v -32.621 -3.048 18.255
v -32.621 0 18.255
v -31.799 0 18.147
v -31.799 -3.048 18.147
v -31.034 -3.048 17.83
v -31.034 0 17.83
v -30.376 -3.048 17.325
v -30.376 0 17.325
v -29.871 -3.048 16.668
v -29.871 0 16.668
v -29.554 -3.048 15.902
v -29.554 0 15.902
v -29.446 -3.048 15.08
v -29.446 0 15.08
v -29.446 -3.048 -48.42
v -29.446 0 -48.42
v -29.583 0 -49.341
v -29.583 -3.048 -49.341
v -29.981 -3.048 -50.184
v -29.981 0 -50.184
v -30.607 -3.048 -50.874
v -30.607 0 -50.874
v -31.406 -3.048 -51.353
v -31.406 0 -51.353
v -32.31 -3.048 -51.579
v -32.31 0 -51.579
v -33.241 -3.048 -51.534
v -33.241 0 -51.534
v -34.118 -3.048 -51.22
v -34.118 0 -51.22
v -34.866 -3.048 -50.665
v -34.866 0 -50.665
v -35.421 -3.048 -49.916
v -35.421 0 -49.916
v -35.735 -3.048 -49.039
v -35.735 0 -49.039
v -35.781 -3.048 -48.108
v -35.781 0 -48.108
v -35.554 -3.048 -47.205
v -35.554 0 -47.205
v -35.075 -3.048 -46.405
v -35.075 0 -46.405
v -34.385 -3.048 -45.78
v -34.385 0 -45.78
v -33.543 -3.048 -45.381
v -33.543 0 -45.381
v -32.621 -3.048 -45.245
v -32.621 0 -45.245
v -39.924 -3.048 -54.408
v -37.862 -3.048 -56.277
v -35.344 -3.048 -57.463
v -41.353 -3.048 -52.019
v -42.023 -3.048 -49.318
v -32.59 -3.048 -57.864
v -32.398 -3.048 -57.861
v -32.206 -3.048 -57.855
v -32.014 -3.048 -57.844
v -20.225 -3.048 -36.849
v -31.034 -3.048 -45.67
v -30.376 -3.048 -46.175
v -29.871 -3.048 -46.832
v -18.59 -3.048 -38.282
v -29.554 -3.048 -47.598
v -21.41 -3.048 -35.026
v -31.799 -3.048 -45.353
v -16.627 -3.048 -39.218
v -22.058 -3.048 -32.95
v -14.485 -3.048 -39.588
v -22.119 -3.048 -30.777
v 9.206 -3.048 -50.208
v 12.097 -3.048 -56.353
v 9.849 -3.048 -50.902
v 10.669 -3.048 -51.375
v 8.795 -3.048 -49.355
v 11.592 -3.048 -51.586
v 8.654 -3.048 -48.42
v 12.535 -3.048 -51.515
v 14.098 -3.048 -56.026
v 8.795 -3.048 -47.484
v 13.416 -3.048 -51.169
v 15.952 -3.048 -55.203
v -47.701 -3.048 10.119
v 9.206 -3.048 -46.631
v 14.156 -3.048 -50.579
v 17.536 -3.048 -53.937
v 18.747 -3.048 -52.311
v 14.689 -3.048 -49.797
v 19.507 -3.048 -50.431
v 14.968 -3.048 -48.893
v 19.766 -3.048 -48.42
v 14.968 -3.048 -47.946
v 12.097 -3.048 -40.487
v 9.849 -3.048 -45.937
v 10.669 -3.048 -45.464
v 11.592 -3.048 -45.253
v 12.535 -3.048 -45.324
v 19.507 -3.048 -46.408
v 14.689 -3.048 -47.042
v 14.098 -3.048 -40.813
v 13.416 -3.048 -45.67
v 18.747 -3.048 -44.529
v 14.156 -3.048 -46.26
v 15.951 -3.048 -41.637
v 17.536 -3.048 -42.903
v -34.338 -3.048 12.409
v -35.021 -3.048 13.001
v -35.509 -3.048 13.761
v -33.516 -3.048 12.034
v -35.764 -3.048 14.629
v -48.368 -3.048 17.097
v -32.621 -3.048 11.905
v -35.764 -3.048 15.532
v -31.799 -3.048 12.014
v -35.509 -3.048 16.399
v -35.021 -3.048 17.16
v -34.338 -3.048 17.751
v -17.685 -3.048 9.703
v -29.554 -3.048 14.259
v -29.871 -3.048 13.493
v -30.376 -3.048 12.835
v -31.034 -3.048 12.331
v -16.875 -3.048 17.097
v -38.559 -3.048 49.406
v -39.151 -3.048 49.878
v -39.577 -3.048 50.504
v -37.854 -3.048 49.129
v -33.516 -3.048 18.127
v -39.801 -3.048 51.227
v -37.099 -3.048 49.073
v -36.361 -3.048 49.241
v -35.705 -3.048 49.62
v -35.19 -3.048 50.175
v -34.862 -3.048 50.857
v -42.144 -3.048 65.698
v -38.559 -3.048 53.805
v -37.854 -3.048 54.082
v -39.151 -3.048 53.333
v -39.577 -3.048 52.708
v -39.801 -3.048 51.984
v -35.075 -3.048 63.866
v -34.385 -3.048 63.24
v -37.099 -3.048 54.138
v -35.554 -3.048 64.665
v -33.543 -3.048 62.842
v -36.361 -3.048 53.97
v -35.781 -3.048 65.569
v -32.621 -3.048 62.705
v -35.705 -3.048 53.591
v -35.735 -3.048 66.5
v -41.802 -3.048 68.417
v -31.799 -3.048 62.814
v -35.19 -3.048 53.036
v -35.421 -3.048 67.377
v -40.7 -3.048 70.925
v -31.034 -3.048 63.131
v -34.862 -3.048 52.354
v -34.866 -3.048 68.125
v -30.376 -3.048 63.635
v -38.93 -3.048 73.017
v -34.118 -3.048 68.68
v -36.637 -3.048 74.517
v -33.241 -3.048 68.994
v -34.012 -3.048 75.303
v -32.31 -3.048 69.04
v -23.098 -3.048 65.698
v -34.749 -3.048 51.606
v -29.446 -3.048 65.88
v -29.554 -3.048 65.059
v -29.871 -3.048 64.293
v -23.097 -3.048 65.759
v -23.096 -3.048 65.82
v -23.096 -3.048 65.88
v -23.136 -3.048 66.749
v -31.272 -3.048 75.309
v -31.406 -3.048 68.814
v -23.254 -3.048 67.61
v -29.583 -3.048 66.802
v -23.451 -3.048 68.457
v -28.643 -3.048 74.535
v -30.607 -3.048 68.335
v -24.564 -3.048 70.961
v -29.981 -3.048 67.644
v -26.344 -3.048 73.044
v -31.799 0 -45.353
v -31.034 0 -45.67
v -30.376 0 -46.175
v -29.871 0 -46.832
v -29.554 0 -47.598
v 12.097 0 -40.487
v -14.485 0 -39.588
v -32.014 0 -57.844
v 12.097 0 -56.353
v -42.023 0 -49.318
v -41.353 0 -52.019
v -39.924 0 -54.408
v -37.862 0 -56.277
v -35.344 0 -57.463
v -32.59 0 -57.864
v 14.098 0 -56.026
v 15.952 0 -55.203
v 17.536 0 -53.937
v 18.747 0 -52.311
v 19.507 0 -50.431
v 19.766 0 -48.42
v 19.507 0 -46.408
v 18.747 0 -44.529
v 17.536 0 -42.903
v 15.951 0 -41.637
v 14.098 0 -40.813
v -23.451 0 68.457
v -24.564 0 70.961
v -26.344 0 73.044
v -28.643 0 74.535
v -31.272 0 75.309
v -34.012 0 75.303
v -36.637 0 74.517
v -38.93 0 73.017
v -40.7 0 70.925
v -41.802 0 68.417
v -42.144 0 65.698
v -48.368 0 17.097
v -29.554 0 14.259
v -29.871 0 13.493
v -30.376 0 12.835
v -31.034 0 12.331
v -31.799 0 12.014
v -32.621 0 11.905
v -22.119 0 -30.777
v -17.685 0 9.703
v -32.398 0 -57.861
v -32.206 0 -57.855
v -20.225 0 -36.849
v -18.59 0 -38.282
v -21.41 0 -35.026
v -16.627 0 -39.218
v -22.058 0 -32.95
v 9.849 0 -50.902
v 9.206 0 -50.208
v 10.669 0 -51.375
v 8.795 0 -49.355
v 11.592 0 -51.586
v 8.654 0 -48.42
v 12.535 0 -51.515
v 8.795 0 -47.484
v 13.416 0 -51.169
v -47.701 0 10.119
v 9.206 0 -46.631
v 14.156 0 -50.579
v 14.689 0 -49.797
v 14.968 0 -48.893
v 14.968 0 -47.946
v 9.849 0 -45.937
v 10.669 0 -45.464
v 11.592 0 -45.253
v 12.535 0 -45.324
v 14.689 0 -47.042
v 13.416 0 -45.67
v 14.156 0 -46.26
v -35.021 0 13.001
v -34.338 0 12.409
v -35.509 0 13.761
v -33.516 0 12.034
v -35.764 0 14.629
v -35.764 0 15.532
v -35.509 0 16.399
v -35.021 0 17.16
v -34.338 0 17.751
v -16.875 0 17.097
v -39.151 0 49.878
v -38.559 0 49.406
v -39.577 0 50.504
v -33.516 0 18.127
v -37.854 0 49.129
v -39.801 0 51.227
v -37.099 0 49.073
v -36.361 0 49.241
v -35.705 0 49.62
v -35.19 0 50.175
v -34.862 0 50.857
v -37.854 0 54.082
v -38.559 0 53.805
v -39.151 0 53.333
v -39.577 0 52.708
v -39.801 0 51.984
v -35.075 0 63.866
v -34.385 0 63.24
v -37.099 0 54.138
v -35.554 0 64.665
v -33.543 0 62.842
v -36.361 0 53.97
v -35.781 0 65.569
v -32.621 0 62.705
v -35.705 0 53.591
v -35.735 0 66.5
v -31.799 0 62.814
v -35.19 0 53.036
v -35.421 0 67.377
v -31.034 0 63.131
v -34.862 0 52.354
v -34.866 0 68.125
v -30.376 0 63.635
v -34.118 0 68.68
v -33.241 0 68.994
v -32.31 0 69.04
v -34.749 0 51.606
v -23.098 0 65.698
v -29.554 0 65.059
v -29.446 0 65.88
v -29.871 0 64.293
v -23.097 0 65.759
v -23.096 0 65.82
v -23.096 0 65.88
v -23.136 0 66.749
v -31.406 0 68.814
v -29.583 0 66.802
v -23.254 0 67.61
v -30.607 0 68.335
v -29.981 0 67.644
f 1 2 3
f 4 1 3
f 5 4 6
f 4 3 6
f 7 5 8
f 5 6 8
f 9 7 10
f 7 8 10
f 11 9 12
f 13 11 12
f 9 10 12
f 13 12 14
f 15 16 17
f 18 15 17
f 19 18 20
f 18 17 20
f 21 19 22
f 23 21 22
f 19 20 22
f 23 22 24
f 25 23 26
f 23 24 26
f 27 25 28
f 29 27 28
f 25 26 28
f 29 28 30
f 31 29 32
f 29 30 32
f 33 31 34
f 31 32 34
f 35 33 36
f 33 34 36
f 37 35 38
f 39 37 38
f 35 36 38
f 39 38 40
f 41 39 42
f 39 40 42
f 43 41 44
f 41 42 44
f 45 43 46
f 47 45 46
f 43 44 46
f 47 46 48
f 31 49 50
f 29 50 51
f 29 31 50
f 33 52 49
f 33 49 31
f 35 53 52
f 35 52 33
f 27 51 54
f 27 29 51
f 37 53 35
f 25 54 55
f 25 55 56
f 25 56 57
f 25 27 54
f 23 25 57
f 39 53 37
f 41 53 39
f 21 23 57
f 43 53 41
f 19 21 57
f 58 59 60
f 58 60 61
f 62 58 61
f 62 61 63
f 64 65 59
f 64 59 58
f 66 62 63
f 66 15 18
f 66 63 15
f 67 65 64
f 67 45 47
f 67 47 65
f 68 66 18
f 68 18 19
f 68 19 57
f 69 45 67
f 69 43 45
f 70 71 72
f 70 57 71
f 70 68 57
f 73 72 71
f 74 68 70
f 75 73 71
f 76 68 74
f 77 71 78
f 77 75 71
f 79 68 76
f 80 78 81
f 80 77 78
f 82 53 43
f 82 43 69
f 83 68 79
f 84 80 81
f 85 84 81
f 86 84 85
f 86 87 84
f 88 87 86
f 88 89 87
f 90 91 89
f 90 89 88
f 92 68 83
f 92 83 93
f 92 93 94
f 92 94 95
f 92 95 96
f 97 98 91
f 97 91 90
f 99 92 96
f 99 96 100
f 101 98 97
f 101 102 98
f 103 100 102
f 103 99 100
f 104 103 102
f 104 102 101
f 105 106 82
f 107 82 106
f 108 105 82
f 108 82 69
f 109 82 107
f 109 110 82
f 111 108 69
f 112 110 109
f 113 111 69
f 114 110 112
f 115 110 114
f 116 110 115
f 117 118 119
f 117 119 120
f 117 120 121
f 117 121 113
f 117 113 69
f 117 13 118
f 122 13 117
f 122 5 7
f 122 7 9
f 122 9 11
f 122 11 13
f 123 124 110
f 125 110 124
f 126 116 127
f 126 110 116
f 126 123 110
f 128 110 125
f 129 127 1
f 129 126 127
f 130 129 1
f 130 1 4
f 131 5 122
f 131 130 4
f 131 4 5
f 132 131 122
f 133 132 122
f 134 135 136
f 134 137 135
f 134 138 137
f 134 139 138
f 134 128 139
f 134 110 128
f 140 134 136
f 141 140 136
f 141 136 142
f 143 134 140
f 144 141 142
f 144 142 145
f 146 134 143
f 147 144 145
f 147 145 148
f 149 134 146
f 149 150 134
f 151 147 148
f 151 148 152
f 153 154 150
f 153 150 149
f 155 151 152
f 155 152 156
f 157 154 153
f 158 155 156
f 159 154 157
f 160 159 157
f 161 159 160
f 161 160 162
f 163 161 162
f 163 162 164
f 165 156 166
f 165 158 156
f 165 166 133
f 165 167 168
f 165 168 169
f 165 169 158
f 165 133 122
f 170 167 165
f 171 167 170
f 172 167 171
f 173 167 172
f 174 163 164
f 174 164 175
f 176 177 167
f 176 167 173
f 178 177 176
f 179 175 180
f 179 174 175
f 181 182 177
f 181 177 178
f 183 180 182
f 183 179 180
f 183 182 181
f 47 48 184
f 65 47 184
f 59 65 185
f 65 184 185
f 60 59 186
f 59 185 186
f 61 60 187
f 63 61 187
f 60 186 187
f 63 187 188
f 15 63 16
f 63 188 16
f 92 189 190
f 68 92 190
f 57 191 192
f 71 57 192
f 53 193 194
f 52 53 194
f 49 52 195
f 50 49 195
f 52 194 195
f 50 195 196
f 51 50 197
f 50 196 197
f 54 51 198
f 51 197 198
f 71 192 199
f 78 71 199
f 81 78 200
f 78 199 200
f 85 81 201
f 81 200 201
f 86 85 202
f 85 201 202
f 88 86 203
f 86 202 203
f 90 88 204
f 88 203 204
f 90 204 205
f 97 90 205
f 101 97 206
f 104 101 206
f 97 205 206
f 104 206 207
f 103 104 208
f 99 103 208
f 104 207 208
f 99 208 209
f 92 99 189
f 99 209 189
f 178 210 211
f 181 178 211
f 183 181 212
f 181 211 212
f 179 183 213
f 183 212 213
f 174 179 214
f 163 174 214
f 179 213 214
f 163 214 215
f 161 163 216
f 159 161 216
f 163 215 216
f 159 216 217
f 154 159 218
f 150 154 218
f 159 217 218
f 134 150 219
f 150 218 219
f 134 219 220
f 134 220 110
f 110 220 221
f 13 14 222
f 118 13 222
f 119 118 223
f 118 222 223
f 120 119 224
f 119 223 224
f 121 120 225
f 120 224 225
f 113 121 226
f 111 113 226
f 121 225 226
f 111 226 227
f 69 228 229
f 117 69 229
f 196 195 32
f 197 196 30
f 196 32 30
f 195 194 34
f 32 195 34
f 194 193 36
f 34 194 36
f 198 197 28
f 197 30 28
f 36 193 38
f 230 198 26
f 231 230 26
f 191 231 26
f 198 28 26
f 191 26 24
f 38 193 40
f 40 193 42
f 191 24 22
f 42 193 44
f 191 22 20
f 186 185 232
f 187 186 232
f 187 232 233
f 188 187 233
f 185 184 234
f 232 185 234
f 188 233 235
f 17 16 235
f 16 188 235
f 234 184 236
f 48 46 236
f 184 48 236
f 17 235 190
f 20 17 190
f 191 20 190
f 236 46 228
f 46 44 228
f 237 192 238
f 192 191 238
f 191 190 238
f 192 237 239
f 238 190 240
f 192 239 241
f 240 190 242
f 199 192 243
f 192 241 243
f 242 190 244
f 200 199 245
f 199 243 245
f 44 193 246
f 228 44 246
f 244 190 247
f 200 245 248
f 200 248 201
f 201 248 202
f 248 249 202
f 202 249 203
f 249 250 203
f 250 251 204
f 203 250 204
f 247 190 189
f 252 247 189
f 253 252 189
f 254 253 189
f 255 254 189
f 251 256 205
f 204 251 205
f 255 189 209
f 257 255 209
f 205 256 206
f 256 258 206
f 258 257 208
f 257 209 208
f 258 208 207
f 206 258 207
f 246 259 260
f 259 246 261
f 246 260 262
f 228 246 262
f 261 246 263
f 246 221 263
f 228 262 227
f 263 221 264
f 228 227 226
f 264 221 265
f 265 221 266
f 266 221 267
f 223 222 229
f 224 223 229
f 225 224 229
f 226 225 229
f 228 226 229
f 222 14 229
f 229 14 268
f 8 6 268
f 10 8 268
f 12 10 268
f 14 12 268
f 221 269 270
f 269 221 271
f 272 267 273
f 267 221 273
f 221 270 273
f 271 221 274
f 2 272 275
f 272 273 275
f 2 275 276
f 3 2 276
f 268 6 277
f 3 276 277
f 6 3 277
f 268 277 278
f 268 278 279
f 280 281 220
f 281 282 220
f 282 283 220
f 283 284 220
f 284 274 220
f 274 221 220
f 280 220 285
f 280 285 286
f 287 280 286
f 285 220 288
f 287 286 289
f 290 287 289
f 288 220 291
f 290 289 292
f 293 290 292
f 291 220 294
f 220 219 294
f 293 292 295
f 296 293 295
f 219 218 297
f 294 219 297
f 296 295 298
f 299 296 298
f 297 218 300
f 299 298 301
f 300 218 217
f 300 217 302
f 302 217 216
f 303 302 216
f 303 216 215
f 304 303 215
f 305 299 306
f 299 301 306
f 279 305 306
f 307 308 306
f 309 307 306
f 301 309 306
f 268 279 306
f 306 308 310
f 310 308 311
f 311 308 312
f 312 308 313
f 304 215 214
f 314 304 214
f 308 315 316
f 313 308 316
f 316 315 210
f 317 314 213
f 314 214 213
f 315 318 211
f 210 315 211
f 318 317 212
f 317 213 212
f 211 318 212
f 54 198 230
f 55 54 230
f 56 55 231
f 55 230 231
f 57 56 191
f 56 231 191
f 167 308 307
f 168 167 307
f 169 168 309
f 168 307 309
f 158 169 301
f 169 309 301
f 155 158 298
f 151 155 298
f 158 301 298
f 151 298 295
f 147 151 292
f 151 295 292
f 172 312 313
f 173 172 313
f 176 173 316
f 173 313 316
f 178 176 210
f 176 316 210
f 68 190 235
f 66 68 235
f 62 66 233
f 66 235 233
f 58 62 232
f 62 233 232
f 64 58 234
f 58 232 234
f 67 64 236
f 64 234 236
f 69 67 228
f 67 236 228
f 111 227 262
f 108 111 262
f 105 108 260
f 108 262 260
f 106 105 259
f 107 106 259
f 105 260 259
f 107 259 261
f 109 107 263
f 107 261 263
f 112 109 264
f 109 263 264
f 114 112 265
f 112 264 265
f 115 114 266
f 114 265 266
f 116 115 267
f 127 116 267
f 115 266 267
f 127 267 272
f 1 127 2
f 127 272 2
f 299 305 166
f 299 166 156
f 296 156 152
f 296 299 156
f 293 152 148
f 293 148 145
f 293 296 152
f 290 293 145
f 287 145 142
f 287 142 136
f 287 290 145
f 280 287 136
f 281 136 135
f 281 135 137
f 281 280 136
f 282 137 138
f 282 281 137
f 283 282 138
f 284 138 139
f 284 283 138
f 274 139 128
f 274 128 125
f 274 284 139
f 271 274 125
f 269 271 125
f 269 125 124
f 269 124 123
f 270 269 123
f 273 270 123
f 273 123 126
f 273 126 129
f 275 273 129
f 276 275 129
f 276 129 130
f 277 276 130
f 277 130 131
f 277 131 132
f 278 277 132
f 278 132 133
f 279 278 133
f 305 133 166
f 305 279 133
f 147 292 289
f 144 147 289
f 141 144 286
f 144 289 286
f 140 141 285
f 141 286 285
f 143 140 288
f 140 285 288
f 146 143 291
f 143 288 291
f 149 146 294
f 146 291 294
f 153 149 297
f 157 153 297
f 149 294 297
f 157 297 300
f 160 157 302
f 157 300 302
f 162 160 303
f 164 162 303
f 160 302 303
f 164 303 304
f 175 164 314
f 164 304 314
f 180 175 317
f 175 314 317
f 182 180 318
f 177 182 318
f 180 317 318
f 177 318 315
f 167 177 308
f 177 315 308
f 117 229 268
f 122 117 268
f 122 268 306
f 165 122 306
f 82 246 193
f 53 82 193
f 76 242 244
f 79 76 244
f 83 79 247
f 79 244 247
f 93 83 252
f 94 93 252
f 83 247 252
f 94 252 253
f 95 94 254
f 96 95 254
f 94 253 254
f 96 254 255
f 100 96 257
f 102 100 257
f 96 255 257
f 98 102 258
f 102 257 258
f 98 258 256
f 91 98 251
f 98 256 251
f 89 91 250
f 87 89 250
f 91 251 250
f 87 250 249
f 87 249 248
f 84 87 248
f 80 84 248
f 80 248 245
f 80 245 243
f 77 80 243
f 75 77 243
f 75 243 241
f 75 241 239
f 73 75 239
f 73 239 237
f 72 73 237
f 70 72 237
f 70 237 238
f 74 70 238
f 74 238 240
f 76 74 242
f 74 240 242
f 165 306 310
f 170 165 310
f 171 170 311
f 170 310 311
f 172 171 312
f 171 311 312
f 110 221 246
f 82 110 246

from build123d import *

# Parameters (mm, degrees)
F0_R     = 2.54
F1_DEPTH = 3.048


with BuildPart() as f1:
    # F0 (on Front) → F1 (new body)
    with BuildSketch(Plane.XZ):
        with BuildLine():
            ThreePointArc((-42.1443581445, 65.6977605384), (-39.2914232505, 59.08092793), (-32.6211089313, 56.3553787816))
            ThreePointArc((-32.6211089313, 56.3553787816), (-25.9507946121, 59.08092793), (-23.0978597181, 65.6977605384))
            Line((-23.0978597181, 65.6977605384), (-23.4511180552, 68.456595452))
            ThreePointArc((-23.4511180552, 68.456595452), (-34.0117887591, 75.3033100992), (-42.1443581445, 65.6977605384))
        make_face()
        with BuildLine():
            ThreePointArc((-29.4461089313, 65.8803787816), (-30.376044901, 63.6353147513), (-32.6211089313, 62.7053787816))
            ThreePointArc((-32.6211089313, 62.7053787816), (-34.8661729616, 68.1254428119), (-29.4461089313, 65.8803787816))
        make_face(mode=Mode.SUBTRACT)
        with BuildLine():
            ThreePointArc((-23.0978597181, 65.6977605384), (-25.9507946121, 59.08092793), (-32.6211089313, 56.3553787816))
            Line((-32.6211089313, 56.3553787816), (-32.6211089313, 30.9553787816))
            ThreePointArc((-32.6211089313, 30.9553787816), (-22.1328460742, 26.997256193), (-16.8746720522, 17.0966502448))
            Line((-16.8746720522, 17.0966502448), (-23.0978597181, 65.6977605384))
        make_face()
        with BuildLine():
            Line((-32.6211089313, 30.9553787816), (-32.6211089313, 56.3553787816))
            ThreePointArc((-32.6211089313, 56.3553787816), (-39.2914232505, 59.08092793), (-42.1443581445, 65.6977605384))
            Line((-42.1443581445, 65.6977605384), (-48.3675458104, 17.0966502448))
            ThreePointArc((-48.3675458104, 17.0966502448), (-43.1093717885, 26.997256193), (-32.6211089313, 30.9553787816))
        make_face()
        with Locations((-37.2888706625, 51.6055787816)):
            Circle(F0_R, mode=Mode.SUBTRACT)
        with BuildLine():
            ThreePointArc((-16.8746720522, 17.0966502448), (-22.1328460742, 26.997256193), (-32.6211089313, 30.9553787816))
            Line((-32.6211089313, 30.9553787816), (-32.6211089313, 18.2553787816))
            ThreePointArc((-32.6211089313, 18.2553787816), (-30.376044901, 17.3254428119), (-29.4461089313, 15.0803787816))
            ThreePointArc((-29.4461089313, 15.0803787816), (-30.376044901, 12.8353147513), (-32.6211089313, 11.9053787816))
            Line((-32.6211089313, 11.9053787816), (-32.6211089313, -0.7946212184))
            ThreePointArc((-32.6211089313, -0.7946212184), (-23.4929168915, 2.0922405361), (-17.6846402517, 9.7028767237))
            Line((-17.6846402517, 9.7028767237), (-16.8746720522, 17.0966502448))
        make_face()
        with BuildLine():
            Line((-32.6211089313, 18.2553787816), (-32.6211089313, 30.9553787816))
            ThreePointArc((-32.6211089313, 30.9553787816), (-43.1093717885, 26.997256193), (-48.3675458104, 17.0966502448))
            Line((-48.3675458104, 17.0966502448), (-47.7009565636, 10.1191470405))
            ThreePointArc((-47.7009565636, 10.1191470405), (-41.9285272391, 2.2200681538), (-32.6211089313, -0.7946212184))
            Line((-32.6211089313, -0.7946212184), (-32.6211089313, 11.9053787816))
            ThreePointArc((-32.6211089313, 11.9053787816), (-35.7961089313, 15.0803787816), (-32.6211089313, 18.2553787816))
        make_face()
        with BuildLine():
            Line((-23.4511180552, 68.456595452), (-23.0978597181, 65.6977605384))
            ThreePointArc((-23.0978597181, 65.6977605384), (-23.0965466381, 65.7890654638), (-23.0961089313, 65.8803787816))
            ThreePointArc((-23.0961089313, 65.8803787816), (-23.1852785997, 67.1806598869), (-23.4511180552, 68.456595452))
        make_face()
        with BuildLine():
            Line((-22.1190817772, -30.7768067438), (-17.6846402517, 9.7028767237))
            ThreePointArc((-17.6846402517, 9.7028767237), (-23.4929168915, 2.0922405361), (-32.6211089313, -0.7946212184))
            Line((-32.6211089313, -0.7946212184), (-32.6211089313, -38.9752205832))
            ThreePointArc((-32.6211089313, -38.9752205832), (-25.9429091979, -41.741421485), (-23.1767082961, -48.4196212184))
            Line((-23.1767082961, -48.4196212184), (3.8913910687, -48.4196212184))
            ThreePointArc((3.8913910687, -48.4196212184), (6.3118425433, -42.7129512772), (12.0970179835, -40.4866511436))
            Line((12.0970179835, -40.4866511436), (-14.4847162499, -39.5882135694))
            ThreePointArc((-14.4847162499, -39.5882135694), (-20.2247777383, -36.848527779), (-22.1190817772, -30.7768067438))
        make_face()
        with BuildLine():
            ThreePointArc((-32.6211089313, -0.7946212184), (-41.9285272391, 2.2200681538), (-47.7009565636, 10.1191470405))
            Line((-47.7009565636, 10.1191470405), (-42.0227039741, -49.3177938133))
            ThreePointArc((-42.0227039741, -49.3177938133), (-39.609649737, -42.0669052034), (-32.6211089313, -38.9752205832))
            Line((-32.6211089313, -38.9752205832), (-32.6211089313, -0.7946212184))
        make_face()
        with BuildLine():
            ThreePointArc((-32.6211089313, -38.9752205832), (-39.609649737, -42.0669052034), (-42.0227039741, -49.3177938133))
            ThreePointArc((-42.0227039741, -49.3177938133), (-38.9622943166, -55.4186262383), (-32.5899670381, -57.86397051))
            Line((-32.5899670381, -57.86397051), (-32.0140661705, -57.8444927))
            ThreePointArc((-32.0140661705, -57.8444927), (-25.7316293285, -54.8796346984), (-23.1767082961, -48.4196212184))
            ThreePointArc((-23.1767082961, -48.4196212184), (-25.9429091979, -41.741421485), (-32.6211089313, -38.9752205832))
        make_face()
        with BuildLine():
            ThreePointArc((-32.6211089313, -45.2446212184), (-30.376044901, -46.1745571881), (-29.4461089313, -48.4196212184))
            ThreePointArc((-29.4461089313, -48.4196212184), (-34.8661729616, -50.6646852487), (-32.6211089313, -45.2446212184))
        make_face(mode=Mode.SUBTRACT)
        with BuildLine():
            Line((-32.0140661705, -57.8444927), (-32.5899670381, -57.86397051))
            ThreePointArc((-32.5899670381, -57.86397051), (-32.30186802, -57.8586247993), (-32.0140661705, -57.8444927))
        make_face()
        with BuildLine():
            Line((3.8913910687, -48.4196212184), (-23.1767082961, -48.4196212184))
            ThreePointArc((-23.1767082961, -48.4196212184), (-25.7316293285, -54.8796346984), (-32.0140661705, -57.8444927))
            Line((-32.0140661705, -57.8444927), (12.0971955203, -56.3525852906))
            ThreePointArc((12.0971955203, -56.3525852906), (6.3119064002, -54.126352894), (3.8913910687, -48.4196212184))
        make_face()
        with BuildLine():
            ThreePointArc((19.7663910687, -48.4196212184), (17.5355610099, -42.902572693), (12.0970179835, -40.4866511436))
            ThreePointArc((12.0970179835, -40.4866511436), (6.3118425433, -42.7129512772), (3.8913910687, -48.4196212184))
            ThreePointArc((3.8913910687, -48.4196212184), (6.3119064002, -54.126352894), (12.0971955203, -56.3525852906))
            ThreePointArc((12.0971955203, -56.3525852906), (17.5356227443, -53.9366058869), (19.7663910687, -48.4196212184))
        make_face()
        with BuildLine():
            ThreePointArc((15.0038910687, -48.4196212184), (11.8288910687, -51.5946212184), (8.6538910687, -48.4196212184))
            ThreePointArc((8.6538910687, -48.4196212184), (11.8288910687, -45.2446212184), (15.0038910687, -48.4196212184))
        make_face(mode=Mode.SUBTRACT)
    extrude(amount=F1_DEPTH)


solid = f1.part
